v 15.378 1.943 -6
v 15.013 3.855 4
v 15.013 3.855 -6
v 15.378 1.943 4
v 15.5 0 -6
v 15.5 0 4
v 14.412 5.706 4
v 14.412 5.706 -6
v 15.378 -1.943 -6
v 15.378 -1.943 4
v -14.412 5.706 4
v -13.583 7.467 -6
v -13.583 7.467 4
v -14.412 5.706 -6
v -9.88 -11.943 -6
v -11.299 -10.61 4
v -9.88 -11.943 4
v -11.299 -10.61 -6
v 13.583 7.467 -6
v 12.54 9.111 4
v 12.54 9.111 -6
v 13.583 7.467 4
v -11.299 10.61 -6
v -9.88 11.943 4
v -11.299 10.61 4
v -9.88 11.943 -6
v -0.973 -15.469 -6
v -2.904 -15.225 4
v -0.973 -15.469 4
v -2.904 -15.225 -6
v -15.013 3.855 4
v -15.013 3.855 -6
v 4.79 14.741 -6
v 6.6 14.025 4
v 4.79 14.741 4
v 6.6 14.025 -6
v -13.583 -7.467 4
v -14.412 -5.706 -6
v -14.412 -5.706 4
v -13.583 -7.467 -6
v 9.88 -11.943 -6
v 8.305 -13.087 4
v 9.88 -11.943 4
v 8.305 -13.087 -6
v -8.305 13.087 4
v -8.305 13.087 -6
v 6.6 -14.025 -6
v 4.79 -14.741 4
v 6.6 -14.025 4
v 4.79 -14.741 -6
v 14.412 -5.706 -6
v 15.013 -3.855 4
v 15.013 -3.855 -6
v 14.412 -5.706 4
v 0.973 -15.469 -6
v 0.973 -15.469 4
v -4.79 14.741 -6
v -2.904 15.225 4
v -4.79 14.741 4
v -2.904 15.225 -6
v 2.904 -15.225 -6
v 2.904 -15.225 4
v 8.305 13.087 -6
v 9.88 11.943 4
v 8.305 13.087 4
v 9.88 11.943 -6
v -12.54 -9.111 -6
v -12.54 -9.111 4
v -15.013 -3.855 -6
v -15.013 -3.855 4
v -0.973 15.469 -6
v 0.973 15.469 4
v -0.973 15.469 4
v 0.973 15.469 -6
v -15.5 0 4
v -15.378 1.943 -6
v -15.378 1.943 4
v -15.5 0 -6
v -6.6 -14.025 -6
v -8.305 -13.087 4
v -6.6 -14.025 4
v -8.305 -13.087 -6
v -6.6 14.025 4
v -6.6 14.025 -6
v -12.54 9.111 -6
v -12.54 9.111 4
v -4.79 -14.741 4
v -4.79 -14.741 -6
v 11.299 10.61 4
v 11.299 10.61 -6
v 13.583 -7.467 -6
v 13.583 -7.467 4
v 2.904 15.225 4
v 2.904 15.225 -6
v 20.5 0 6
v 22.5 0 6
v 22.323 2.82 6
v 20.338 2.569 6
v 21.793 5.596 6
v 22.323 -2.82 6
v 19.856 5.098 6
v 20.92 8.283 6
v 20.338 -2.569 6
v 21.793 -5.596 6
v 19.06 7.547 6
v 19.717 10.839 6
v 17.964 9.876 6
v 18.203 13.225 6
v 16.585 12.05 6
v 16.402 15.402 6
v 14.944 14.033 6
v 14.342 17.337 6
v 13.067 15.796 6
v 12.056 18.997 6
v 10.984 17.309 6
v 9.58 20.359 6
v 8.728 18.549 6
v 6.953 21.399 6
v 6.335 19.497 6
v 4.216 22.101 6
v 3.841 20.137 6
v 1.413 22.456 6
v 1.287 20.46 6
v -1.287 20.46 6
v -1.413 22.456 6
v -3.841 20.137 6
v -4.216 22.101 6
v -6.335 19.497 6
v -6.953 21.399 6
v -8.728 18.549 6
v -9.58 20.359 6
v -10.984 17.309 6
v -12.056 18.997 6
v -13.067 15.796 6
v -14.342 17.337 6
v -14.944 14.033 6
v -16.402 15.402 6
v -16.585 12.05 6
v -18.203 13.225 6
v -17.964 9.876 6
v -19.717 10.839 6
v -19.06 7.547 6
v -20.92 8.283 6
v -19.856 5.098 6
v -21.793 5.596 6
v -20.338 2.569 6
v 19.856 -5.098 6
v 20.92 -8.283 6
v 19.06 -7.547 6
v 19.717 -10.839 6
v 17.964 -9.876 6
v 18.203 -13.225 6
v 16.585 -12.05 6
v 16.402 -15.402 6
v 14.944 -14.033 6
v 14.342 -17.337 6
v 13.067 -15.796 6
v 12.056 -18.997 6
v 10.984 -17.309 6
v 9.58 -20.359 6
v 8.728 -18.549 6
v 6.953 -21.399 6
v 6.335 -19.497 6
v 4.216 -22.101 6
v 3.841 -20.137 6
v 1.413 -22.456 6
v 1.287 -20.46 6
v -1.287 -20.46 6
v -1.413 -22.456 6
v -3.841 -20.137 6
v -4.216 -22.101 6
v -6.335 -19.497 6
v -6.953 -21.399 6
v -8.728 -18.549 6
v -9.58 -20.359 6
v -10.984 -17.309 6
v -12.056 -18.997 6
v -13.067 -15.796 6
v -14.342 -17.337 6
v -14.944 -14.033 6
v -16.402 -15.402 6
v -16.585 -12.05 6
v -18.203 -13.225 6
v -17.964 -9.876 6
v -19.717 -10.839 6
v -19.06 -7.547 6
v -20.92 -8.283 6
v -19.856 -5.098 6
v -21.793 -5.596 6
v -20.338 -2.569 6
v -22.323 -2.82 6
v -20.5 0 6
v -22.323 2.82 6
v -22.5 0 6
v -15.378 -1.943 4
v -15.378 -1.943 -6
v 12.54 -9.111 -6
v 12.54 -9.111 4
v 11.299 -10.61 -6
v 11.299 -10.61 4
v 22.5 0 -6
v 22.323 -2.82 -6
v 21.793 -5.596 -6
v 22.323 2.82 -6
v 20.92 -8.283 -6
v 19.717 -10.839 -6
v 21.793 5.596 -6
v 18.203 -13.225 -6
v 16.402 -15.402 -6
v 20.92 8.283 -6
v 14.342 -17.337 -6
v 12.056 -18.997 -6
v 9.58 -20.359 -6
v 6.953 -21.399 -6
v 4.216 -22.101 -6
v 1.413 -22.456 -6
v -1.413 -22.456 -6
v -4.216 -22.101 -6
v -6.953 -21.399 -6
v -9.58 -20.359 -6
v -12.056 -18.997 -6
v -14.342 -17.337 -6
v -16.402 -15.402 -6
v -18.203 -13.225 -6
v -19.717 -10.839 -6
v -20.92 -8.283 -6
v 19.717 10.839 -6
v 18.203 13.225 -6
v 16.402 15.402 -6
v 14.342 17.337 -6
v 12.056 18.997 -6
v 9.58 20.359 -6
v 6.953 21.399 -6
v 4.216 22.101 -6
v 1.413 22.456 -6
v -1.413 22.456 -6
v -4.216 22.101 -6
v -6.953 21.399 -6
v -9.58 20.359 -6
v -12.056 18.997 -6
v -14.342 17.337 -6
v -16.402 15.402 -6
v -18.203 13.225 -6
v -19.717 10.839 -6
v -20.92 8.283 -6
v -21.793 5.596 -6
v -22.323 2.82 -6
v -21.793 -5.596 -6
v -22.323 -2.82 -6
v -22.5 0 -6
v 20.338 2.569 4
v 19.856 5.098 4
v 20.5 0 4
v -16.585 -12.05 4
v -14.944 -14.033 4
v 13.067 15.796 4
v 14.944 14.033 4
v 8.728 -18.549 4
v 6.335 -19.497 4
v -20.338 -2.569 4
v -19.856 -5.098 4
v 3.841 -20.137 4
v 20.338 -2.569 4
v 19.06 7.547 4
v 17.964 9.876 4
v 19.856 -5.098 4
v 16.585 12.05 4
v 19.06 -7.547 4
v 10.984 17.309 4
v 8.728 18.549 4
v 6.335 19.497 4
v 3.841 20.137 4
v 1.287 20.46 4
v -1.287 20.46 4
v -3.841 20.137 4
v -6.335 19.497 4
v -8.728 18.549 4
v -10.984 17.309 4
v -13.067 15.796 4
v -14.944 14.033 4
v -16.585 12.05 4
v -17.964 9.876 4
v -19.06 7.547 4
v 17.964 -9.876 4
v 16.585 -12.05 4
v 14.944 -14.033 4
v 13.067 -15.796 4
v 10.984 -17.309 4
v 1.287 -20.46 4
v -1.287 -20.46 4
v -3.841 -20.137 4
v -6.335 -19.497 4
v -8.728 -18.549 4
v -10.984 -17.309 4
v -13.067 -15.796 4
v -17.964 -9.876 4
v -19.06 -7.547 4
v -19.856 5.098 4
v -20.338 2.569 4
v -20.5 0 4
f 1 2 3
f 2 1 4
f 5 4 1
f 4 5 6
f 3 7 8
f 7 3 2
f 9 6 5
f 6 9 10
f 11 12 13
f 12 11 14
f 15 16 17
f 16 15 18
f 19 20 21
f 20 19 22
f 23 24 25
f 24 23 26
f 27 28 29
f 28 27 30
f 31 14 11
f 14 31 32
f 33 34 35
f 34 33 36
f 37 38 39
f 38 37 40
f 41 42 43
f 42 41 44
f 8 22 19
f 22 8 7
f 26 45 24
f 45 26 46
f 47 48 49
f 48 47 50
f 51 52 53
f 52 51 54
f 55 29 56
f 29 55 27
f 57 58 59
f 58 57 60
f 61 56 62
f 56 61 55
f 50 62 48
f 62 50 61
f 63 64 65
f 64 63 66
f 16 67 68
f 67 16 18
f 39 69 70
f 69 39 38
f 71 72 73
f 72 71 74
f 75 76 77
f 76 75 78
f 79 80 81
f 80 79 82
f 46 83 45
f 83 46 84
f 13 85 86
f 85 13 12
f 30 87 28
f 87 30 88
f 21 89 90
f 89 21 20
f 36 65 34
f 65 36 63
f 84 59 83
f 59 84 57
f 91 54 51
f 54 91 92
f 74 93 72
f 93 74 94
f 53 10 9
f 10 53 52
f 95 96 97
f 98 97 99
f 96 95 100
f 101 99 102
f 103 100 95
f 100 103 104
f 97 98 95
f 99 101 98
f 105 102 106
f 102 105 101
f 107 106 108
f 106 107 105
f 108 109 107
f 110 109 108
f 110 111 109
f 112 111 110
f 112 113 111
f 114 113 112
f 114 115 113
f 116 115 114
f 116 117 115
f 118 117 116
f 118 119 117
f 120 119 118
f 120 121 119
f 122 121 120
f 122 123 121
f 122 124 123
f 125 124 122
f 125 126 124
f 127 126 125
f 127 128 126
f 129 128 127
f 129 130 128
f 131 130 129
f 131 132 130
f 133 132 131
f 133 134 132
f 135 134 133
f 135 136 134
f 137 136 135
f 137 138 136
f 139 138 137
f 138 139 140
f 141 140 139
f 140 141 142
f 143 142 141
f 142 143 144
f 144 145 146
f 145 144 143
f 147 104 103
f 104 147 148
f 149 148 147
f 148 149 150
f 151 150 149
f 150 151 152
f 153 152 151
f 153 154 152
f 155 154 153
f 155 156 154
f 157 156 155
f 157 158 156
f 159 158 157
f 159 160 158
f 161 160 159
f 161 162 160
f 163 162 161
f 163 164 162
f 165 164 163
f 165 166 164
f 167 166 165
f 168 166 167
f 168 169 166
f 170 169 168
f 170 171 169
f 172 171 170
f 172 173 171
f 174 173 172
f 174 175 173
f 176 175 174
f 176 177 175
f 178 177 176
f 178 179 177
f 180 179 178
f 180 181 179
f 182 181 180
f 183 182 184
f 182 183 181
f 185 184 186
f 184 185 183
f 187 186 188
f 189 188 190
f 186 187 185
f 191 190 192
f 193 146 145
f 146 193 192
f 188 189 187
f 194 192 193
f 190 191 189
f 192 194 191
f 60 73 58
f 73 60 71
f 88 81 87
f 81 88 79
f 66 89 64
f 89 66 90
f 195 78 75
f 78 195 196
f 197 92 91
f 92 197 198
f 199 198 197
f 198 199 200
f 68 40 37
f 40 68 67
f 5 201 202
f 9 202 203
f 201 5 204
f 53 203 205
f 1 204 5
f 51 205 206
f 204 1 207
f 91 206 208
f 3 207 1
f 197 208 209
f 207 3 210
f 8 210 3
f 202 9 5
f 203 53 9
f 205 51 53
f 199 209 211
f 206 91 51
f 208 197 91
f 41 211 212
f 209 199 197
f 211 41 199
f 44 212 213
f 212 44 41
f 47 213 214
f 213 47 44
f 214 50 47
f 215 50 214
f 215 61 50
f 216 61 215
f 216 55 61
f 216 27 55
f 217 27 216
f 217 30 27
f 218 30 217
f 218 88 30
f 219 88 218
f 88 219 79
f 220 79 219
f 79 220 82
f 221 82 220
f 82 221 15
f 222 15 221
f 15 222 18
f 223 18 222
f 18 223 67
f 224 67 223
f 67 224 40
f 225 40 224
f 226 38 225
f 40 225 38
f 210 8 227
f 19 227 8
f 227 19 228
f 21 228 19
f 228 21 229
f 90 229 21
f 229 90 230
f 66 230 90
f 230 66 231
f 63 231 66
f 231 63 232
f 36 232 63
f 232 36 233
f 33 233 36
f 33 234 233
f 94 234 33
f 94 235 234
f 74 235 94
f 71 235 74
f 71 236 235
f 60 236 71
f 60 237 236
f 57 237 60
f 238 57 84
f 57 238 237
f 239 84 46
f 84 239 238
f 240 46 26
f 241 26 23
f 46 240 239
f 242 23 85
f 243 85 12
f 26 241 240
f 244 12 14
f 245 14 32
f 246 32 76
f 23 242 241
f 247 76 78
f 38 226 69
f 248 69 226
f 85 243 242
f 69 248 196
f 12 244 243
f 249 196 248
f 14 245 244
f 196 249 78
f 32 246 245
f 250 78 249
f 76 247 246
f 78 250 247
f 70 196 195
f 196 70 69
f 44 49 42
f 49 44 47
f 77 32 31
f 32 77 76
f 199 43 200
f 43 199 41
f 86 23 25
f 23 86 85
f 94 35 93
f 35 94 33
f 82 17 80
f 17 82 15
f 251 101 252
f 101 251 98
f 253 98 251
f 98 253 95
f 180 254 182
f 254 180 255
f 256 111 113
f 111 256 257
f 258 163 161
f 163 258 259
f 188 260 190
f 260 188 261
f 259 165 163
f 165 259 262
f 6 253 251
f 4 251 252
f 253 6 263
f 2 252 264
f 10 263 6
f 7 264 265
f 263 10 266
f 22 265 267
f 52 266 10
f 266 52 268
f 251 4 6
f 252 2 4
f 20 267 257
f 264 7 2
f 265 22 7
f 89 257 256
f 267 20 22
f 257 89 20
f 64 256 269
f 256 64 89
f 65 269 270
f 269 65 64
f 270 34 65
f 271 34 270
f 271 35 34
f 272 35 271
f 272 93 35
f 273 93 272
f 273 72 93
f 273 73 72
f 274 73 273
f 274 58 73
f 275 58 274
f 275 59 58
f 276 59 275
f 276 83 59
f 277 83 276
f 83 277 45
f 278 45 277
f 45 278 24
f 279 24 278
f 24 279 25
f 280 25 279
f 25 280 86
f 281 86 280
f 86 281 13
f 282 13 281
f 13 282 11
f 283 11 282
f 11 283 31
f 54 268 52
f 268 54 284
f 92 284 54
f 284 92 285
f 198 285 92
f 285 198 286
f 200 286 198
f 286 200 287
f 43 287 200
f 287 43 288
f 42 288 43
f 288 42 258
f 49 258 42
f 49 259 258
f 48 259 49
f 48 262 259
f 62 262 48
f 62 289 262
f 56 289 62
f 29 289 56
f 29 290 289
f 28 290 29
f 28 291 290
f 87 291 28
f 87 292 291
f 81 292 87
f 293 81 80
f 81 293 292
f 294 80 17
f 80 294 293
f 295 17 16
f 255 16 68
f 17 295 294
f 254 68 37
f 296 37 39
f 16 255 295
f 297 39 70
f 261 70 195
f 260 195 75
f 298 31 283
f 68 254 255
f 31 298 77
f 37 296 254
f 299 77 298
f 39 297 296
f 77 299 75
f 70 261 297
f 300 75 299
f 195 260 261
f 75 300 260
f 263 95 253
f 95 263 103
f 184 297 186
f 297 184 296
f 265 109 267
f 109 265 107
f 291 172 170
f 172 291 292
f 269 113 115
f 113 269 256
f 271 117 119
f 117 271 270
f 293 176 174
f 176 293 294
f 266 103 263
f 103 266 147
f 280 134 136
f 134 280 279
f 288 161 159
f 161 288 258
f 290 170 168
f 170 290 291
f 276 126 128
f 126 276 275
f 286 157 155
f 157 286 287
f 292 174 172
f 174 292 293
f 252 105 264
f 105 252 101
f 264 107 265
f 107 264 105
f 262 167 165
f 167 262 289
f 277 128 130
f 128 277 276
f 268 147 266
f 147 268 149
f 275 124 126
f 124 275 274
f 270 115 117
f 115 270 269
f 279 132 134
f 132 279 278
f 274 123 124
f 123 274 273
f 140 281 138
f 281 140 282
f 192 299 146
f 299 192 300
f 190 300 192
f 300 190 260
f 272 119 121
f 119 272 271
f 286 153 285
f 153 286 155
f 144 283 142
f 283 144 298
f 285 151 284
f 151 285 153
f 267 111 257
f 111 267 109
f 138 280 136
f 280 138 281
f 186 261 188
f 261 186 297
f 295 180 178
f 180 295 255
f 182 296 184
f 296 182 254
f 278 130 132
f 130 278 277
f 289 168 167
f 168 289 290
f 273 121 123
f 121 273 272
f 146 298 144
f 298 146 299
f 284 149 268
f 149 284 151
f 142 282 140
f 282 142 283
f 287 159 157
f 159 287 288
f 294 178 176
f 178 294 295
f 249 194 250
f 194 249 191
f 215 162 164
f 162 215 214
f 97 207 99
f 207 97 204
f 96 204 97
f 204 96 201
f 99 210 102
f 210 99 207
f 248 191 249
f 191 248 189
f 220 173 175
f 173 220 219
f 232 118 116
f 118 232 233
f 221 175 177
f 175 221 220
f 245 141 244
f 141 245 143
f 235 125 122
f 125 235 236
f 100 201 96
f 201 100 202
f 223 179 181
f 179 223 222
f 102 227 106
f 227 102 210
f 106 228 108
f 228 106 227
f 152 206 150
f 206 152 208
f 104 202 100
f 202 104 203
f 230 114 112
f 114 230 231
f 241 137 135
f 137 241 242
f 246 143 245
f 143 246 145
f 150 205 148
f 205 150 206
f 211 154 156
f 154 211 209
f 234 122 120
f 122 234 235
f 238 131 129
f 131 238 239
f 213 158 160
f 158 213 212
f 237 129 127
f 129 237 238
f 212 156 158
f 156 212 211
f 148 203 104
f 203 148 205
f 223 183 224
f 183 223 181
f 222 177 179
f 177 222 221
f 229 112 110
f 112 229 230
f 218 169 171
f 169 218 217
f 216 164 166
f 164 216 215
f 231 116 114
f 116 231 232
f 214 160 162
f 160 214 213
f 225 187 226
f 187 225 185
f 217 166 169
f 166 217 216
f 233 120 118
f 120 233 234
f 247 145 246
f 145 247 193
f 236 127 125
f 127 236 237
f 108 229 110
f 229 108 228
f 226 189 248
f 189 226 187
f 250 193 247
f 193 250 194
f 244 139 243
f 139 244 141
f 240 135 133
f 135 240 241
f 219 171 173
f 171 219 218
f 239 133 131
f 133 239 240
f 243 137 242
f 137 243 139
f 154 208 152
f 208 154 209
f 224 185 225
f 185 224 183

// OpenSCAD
$fn = 50;


difference() {
	union() {
		translate(v = [0, 0, -6.0000000000]) {
			cylinder(h = 12, r = 22.5000000000);
		}
	}
	union() {
		#translate(v = [0, 0, -6.0000000000]) {
			cylinder(h = 12, r = 15.5000000000);
		}
		translate(v = [0, 0, 4.0000000000]) {
			cylinder(h = 2, r = 20.5000000000);
		}
	}
}
